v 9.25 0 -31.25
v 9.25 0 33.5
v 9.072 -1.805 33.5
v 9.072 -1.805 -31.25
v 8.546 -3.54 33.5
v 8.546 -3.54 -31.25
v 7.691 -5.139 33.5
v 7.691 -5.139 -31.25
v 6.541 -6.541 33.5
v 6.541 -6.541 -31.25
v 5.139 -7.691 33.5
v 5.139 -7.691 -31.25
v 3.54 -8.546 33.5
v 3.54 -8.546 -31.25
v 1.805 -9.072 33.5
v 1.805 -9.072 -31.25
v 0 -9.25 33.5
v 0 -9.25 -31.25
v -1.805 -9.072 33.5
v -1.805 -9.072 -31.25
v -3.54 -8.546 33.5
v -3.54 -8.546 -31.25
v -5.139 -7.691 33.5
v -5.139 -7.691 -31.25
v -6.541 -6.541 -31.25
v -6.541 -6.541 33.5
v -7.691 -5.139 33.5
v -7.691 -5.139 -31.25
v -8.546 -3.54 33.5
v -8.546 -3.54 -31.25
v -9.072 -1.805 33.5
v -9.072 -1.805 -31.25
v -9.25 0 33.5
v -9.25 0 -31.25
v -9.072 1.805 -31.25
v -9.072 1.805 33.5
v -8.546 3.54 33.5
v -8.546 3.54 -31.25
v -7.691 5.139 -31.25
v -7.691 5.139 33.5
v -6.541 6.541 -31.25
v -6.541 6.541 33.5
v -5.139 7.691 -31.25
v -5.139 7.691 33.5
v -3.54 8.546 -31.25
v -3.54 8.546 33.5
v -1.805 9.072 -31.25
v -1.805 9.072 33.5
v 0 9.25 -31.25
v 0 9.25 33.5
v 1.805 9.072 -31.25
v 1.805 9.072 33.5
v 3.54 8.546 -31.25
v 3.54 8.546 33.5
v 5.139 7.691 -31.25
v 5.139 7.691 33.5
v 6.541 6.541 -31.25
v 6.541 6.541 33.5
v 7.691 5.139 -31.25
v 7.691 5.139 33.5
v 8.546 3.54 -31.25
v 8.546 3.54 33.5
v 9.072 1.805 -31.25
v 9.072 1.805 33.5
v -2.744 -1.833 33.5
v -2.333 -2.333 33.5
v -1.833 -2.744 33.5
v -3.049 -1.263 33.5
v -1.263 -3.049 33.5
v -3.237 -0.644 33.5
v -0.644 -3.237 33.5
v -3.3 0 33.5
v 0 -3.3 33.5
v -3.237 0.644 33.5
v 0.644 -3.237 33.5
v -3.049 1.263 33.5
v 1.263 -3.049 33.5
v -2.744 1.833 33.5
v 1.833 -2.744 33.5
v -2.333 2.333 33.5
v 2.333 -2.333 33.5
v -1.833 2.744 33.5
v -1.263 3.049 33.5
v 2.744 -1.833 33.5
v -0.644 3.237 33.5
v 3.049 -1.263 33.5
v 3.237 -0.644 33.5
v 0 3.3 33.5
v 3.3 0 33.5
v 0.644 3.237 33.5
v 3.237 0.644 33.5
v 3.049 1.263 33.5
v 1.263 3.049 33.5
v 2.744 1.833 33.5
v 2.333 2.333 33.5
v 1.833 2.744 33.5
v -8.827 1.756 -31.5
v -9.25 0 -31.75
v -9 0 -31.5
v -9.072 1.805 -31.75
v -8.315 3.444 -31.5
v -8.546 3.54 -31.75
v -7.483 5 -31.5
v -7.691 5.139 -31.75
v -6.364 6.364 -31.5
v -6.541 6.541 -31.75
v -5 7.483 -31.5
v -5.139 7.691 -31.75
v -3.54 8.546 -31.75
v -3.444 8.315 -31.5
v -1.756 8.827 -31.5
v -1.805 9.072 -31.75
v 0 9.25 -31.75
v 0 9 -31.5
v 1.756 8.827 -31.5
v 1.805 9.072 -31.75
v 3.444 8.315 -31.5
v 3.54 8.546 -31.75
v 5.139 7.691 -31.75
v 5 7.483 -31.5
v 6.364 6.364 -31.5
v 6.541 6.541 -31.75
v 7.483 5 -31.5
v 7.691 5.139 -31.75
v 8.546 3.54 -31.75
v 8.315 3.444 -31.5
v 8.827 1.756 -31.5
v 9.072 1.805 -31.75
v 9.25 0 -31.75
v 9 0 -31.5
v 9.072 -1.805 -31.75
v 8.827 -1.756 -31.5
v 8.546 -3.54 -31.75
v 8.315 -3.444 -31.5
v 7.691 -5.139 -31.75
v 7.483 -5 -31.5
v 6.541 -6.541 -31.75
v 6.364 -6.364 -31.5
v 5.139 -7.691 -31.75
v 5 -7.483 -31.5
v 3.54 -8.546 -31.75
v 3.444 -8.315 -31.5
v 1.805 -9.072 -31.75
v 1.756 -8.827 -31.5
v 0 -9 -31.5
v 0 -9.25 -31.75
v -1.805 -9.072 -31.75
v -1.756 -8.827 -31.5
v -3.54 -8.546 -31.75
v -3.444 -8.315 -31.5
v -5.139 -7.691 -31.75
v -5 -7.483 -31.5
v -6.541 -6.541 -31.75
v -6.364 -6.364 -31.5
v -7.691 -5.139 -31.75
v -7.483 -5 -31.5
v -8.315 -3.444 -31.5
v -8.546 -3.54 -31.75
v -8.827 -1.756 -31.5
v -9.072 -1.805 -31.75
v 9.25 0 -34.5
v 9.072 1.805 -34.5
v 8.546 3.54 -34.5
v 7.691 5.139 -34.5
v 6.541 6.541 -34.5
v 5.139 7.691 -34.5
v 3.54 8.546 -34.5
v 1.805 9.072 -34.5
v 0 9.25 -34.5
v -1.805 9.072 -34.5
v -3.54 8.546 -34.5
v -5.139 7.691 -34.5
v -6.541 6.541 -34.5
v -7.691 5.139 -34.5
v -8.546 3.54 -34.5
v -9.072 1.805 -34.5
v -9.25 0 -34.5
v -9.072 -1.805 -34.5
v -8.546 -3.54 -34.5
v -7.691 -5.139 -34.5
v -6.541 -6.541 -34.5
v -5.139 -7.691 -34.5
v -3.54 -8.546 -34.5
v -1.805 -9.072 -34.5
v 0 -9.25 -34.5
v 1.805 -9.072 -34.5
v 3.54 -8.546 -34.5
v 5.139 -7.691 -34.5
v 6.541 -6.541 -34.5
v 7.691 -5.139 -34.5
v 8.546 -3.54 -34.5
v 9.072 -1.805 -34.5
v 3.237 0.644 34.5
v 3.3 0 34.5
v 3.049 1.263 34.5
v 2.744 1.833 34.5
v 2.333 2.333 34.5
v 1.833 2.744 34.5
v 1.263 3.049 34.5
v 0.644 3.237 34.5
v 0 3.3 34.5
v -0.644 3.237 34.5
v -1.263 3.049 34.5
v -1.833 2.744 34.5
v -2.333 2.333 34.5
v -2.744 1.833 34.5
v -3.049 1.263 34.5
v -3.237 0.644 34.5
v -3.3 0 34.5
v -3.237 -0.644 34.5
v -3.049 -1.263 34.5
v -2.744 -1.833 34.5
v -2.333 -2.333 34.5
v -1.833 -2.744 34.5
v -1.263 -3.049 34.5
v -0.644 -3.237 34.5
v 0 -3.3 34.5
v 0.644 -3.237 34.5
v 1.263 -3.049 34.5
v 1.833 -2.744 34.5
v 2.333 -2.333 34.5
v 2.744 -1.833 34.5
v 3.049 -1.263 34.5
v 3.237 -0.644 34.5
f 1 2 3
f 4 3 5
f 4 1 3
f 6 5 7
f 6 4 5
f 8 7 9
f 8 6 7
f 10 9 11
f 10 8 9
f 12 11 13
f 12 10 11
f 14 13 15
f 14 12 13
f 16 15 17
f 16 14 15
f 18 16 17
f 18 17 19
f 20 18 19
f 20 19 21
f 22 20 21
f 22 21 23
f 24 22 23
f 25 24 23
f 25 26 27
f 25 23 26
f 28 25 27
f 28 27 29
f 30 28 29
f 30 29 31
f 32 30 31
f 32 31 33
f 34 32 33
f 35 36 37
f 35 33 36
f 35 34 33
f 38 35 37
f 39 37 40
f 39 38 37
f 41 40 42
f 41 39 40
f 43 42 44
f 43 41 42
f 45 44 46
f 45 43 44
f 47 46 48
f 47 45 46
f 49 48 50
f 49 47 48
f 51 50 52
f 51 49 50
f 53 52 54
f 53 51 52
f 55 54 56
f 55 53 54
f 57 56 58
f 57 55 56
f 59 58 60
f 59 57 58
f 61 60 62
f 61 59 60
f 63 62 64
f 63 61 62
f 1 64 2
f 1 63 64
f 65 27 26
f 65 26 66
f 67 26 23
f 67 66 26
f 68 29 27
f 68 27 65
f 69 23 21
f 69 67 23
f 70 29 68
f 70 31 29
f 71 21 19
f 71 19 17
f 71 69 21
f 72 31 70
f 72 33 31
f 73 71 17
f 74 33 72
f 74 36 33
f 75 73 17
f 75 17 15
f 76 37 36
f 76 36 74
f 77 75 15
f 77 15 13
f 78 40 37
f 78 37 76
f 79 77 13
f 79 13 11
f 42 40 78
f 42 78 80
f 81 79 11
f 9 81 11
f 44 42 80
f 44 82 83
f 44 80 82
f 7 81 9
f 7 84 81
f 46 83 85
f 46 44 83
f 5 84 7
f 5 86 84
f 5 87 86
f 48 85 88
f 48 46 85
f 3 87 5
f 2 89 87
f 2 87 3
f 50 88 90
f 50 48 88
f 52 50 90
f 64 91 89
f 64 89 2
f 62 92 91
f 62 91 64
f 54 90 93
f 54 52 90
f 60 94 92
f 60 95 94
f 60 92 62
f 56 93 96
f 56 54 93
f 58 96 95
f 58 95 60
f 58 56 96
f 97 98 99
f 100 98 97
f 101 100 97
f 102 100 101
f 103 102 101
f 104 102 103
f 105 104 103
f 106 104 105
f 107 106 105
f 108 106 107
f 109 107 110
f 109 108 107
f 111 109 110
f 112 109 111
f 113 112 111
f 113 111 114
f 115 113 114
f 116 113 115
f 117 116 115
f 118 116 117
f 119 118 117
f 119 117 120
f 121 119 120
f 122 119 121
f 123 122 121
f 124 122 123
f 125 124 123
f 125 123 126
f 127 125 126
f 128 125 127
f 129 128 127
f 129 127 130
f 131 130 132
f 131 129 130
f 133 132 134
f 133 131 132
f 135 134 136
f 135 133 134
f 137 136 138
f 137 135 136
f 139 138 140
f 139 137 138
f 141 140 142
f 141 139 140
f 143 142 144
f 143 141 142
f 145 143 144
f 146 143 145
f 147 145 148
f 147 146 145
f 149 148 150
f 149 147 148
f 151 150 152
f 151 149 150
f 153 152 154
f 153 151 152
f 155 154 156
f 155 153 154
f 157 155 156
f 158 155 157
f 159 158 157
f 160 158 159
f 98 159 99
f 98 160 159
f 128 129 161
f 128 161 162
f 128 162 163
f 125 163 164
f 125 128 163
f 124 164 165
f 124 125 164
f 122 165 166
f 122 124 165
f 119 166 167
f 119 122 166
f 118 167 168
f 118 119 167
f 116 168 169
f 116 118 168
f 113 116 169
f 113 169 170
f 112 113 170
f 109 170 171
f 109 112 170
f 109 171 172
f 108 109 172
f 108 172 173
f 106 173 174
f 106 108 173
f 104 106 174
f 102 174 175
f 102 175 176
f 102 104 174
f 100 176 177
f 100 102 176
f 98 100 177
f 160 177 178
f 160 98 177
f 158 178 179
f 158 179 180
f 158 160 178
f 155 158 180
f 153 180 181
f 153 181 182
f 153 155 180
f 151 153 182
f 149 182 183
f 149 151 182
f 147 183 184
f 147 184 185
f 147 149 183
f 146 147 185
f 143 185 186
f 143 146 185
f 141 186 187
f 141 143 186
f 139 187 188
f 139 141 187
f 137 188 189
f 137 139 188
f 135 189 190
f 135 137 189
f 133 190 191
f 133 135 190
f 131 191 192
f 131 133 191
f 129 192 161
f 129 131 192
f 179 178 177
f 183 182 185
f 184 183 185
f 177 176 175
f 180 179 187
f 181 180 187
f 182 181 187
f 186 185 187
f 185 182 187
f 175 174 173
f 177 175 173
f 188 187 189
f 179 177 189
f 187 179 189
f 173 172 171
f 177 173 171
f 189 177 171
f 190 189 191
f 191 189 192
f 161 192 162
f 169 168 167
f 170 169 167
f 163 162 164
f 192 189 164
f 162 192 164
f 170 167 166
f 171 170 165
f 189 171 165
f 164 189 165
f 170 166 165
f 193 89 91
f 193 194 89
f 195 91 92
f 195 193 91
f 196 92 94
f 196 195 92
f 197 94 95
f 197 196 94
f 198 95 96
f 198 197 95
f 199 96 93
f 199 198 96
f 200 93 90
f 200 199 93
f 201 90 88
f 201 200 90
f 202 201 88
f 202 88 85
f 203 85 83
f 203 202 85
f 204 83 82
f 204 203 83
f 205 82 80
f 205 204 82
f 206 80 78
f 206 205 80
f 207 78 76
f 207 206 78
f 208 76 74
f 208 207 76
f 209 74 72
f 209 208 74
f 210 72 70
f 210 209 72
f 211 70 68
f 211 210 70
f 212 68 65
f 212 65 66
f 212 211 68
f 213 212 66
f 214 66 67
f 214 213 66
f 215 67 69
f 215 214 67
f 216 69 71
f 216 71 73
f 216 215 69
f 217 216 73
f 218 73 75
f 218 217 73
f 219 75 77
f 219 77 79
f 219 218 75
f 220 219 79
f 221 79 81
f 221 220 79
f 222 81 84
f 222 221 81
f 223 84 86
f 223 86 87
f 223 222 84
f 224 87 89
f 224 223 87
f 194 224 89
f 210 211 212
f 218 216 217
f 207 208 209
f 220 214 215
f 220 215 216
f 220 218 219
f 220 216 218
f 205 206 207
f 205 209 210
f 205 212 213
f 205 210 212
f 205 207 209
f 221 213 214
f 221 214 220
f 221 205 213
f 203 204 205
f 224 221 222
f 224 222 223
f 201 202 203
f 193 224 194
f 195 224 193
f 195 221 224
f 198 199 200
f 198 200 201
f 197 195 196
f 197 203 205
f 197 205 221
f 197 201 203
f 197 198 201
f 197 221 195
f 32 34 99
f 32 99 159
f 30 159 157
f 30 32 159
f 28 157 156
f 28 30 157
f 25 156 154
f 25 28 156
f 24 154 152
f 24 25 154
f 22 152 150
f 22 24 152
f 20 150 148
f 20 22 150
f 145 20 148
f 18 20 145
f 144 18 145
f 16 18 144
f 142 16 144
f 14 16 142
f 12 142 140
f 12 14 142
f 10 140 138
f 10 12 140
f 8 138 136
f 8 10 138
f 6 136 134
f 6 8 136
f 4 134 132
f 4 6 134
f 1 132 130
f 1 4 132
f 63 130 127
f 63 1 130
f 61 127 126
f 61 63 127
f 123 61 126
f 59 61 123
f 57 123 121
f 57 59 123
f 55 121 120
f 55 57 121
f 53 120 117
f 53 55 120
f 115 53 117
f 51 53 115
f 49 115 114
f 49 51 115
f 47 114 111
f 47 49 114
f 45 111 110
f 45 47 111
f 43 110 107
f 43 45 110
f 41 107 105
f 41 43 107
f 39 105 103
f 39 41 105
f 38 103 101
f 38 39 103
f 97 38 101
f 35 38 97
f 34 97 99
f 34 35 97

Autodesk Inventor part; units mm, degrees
ref_plane "YZ Plane" through (0, 0, 0) normal (1, 0, 0) x (0, 1, 0)
ref_plane "XZ Plane" through (0, 0, 0) normal (0, 1, 0) x (-1, 0, 0)
ref_plane "XY Plane" through (0, 0, 0) normal (0, 0, 1) x (1, 0, 0)
sketch "Skizze1" plane through (0, 0, 0) normal (0, 0, 1) x (1, 0, 0)
  circle A0 centre (0, 0) radius 9.25
  dimension "d0" = 18.5
extrude "Extrusion1" add sketch "Skizze1" along normal mid plane 69
sketch "Skizze2" plane through (0, 0, 34.5) normal (0, 0, 1) x (1, 0, 0)
  circle A0 centre (0, 0) radius 3.3
  circle A1 centre (0, 0) radius 9.25 projected
  dimension "d3" = 6.6
extrude "Extrusion2" cut sketch "Skizze2" against normal blind 1
sketch "Skizze3" plane through (0, 0, 0) normal (0, 1, 0) x (-1, 0, 0)
  line L0 (9.25, -34.5) -> (9.25, 33.5) construction
  line L1 (9.25, -31.25) -> (9, -31.5)
  line L2 (9, -31.5) -> (9.25, -31.75)
  line L3 (-9.25, -34.5) -> (9.25, -34.5) projected
  line L4 (9.25, -31.75) -> (9.25, -31.25)
  line L5 (0, -46.714) -> (0, 45.714) projected
  point P0 (0, 0)
  dimension "d6" = 3
  dimension "d7" = 0.5
revolve "Umdrehung1" cut sketch "Skizze3" angle 360 about axis through (0, 0, -10) along (0, 0, 1)
properties part number "18650" material "Nickel-Kupfer-Legierung 400"
